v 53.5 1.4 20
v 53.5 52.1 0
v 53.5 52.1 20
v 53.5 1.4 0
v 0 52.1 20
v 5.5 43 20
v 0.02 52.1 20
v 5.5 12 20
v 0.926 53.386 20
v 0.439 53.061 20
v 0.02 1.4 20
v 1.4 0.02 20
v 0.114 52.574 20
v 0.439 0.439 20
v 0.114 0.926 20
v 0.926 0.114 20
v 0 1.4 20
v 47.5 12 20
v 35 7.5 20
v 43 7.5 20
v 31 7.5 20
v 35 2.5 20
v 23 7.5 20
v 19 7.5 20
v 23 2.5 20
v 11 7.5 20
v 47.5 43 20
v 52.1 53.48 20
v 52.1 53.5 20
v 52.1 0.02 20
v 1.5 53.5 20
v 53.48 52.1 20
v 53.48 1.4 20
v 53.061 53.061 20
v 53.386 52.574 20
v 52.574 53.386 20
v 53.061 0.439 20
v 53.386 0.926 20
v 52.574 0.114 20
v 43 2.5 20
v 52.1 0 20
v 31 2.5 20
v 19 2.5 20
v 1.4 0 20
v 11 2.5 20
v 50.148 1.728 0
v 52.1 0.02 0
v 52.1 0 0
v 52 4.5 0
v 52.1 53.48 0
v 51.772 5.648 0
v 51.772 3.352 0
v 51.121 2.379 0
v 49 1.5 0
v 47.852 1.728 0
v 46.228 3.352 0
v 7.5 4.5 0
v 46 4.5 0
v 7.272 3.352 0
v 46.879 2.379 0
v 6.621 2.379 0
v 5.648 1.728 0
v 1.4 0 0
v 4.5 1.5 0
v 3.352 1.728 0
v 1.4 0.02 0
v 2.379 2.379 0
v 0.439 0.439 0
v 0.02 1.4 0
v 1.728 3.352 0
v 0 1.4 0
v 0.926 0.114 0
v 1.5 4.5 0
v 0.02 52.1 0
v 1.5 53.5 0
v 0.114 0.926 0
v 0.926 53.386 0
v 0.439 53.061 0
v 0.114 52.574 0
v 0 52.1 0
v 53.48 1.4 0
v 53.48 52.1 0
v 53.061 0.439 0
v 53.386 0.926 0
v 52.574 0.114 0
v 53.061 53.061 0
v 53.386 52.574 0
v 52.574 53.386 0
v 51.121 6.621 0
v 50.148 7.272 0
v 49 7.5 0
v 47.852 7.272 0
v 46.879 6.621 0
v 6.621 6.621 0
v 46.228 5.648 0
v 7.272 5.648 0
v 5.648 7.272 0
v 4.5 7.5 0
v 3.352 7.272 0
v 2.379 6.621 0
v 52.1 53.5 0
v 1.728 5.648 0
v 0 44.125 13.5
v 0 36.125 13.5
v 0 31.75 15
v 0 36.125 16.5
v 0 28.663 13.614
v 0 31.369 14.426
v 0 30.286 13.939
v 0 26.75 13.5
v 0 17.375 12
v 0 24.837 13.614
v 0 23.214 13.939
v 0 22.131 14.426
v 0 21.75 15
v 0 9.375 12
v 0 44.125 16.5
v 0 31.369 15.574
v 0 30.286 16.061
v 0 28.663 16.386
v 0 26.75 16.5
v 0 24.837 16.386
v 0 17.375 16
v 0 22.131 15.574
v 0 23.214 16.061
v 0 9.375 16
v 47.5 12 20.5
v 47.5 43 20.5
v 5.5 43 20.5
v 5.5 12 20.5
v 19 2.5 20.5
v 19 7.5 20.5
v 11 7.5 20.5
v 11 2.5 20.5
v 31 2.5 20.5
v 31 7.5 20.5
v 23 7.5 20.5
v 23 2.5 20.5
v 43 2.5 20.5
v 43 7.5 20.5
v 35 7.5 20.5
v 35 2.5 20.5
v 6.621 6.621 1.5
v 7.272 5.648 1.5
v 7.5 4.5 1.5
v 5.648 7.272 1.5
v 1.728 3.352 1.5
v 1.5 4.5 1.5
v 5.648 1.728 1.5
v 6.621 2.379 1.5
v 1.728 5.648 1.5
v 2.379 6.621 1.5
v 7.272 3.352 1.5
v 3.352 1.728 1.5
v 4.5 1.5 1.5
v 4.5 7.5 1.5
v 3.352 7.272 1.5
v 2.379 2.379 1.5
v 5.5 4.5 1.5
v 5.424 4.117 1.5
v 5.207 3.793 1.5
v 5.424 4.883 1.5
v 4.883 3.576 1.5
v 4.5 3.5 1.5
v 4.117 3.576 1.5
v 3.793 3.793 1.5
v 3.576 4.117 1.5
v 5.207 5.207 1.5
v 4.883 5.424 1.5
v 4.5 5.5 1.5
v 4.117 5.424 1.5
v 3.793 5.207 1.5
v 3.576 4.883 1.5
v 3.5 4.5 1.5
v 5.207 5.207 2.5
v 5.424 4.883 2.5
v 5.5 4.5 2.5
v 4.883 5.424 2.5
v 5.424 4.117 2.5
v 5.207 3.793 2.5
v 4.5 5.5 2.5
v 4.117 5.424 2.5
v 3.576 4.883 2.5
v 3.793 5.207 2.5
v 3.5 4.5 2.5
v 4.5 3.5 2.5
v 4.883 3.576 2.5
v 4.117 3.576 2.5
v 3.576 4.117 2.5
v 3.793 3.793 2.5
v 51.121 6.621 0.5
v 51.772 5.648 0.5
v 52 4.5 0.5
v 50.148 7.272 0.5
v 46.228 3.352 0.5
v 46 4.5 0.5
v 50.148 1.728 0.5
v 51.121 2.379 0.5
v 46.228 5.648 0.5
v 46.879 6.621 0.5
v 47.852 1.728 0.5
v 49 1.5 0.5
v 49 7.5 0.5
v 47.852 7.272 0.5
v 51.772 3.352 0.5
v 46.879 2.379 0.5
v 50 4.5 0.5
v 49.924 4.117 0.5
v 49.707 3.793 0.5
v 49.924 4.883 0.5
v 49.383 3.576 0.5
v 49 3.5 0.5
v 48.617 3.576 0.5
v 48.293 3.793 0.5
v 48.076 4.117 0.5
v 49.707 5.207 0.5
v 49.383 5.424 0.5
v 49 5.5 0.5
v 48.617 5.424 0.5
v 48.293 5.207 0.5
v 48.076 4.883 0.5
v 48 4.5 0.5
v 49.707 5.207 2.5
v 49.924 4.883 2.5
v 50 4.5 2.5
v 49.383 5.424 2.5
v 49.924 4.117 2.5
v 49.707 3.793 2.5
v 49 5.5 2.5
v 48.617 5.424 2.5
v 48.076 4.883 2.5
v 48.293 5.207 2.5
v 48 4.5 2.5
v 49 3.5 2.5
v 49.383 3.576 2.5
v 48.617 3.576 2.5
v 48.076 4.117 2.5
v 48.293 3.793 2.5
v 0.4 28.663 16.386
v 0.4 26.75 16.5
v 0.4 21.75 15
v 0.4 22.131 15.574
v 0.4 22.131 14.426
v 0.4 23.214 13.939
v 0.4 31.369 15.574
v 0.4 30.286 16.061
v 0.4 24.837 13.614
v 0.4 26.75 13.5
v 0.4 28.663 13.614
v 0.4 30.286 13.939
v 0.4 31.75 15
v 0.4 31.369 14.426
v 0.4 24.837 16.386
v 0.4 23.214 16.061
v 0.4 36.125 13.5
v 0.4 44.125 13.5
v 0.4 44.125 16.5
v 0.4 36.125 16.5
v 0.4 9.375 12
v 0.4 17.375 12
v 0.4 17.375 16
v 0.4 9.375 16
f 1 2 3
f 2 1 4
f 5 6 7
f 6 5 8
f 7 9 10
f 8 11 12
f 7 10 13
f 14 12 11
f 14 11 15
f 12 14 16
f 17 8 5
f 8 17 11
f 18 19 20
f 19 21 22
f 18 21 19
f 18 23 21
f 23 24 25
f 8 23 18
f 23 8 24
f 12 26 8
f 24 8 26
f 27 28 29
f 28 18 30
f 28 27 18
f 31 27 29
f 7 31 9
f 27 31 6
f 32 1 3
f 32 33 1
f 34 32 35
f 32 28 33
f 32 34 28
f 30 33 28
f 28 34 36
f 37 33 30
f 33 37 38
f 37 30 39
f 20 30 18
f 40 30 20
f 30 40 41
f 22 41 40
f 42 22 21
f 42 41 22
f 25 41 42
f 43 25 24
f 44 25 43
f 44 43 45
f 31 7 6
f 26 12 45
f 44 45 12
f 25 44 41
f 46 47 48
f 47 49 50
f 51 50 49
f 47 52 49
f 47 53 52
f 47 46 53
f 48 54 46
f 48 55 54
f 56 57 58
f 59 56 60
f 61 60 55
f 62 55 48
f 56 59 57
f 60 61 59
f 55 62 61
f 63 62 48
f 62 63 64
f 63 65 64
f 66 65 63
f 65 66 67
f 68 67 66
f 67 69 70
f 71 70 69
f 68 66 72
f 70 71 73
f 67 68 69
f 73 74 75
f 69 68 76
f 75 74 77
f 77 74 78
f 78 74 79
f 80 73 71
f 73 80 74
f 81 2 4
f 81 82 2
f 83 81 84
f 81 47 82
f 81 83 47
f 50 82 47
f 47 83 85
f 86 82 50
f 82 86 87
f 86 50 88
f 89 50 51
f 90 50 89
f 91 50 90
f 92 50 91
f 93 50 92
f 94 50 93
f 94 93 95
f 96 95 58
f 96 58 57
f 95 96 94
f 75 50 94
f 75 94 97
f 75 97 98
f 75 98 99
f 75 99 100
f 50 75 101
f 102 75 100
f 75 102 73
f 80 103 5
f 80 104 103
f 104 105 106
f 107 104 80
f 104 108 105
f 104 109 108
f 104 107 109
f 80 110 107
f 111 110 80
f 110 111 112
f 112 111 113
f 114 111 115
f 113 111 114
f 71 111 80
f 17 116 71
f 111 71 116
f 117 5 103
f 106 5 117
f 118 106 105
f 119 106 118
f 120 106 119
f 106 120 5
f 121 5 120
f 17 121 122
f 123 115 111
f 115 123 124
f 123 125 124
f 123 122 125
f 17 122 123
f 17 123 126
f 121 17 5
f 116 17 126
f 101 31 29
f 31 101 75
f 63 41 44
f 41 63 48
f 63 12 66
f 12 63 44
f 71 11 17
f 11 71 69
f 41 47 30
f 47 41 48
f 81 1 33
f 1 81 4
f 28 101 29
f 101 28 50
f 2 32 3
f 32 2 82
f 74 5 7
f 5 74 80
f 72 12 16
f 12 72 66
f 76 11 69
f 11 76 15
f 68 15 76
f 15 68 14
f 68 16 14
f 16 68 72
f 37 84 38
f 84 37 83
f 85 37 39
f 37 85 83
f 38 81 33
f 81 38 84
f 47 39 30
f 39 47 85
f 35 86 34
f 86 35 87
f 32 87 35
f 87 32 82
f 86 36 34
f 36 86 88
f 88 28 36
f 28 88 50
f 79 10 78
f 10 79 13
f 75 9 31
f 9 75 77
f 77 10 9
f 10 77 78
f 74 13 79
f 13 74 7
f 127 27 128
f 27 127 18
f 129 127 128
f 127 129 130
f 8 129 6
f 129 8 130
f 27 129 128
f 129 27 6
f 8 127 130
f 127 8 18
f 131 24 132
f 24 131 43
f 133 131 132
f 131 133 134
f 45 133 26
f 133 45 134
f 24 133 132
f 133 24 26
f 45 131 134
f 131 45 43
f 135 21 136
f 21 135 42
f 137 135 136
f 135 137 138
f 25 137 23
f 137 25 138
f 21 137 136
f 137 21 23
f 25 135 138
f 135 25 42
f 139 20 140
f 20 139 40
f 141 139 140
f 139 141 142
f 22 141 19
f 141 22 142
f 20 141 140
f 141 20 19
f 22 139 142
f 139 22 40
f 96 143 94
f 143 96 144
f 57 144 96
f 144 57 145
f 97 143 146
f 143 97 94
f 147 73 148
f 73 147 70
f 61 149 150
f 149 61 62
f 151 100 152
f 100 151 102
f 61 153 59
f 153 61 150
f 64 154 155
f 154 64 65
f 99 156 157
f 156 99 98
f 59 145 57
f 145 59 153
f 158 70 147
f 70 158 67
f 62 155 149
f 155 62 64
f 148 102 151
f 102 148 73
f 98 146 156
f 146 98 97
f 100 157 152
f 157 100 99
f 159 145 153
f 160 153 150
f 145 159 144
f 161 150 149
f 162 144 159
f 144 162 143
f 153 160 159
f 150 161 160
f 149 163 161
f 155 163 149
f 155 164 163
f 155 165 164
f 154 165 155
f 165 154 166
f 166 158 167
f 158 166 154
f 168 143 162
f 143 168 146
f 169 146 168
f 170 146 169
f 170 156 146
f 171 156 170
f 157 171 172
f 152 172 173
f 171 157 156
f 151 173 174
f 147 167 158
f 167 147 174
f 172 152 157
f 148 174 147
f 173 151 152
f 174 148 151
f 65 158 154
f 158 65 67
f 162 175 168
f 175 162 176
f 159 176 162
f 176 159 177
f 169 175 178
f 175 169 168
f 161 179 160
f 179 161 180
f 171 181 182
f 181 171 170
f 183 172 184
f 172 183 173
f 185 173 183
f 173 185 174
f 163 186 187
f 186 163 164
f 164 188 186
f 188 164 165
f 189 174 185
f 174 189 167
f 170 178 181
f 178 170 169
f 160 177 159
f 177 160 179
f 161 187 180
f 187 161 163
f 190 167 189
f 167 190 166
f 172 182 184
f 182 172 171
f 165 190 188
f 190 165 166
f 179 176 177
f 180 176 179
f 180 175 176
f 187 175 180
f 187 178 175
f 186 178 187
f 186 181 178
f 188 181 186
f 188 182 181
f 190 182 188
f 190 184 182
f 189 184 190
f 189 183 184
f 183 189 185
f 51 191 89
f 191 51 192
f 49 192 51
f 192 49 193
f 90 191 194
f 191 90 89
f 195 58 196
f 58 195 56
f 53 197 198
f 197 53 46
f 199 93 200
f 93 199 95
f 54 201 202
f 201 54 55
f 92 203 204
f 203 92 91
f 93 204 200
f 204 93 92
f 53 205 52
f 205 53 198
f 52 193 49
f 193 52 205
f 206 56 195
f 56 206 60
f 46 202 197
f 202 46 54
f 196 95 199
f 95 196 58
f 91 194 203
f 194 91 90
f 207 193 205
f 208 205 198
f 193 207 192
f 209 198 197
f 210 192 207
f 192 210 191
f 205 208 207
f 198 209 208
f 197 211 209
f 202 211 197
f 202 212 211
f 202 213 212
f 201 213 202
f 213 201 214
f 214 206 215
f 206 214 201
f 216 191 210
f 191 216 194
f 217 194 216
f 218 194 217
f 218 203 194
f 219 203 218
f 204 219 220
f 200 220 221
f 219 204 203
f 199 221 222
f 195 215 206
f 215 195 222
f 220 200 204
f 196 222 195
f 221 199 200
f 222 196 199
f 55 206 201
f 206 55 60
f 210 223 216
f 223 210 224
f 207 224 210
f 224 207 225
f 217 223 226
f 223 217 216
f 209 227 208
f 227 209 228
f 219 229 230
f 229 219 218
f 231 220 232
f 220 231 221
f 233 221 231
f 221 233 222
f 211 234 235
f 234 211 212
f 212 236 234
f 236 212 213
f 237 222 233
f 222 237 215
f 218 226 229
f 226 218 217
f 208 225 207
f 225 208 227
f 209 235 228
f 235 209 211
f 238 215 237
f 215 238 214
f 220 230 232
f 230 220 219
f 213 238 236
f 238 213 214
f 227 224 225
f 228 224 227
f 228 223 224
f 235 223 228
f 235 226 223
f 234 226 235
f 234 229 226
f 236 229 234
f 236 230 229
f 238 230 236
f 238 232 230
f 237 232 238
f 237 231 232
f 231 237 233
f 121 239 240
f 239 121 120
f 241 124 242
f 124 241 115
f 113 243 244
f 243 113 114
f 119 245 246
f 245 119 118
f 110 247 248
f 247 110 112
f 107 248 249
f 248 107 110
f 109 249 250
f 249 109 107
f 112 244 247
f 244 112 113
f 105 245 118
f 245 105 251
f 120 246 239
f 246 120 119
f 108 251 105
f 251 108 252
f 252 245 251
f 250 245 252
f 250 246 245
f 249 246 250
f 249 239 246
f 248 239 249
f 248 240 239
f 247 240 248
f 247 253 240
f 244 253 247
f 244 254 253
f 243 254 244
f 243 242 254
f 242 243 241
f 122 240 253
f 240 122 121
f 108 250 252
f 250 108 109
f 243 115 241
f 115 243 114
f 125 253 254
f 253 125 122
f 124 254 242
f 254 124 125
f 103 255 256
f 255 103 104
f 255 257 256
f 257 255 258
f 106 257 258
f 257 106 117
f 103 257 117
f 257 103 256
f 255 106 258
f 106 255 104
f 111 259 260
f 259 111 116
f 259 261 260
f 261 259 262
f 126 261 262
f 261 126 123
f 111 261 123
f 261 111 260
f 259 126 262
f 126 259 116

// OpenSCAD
module core(height = 20) {

    s = 53.5; // inner size
    r = 1.5; // radius and cutout

    difference(){
    union() {
        difference(){
        scale([1,1,1]) color("blue") cube([s,s,height],center=false);

        translate([-.1,-.1,-.1]) scale([1,1,height+1]) cube(r,center=false);
        translate([s-r+.1,-.1,-.1]) scale([1,1,height+1]) cube(r,center=false);

        translate([s-r+.1,s-r+.1,-.1]) scale([1,1,height+1]) cube(r,center=false);
        translate([-.1,s-r+.1,-.1]) scale([1,1,height+1]) cube([r+.1,r+.1,height+1],center=false);

        }

    // radii
    translate([r,r,0]) scale([1,1,1]) cylinder(r=r,h=height,center=false, $fn=16);
    translate([s-r,r,0]) scale([1,1,1]) cylinder(r=r,h=height,center=false, $fn=16);
    translate([s-r,s-r,0]) scale([1,1,1]) cylinder(r=r,h=height,center=false, $fn=16);
    translate([r,s-r,0]) scale([1,1,1]) cylinder(r=r,h=height,center=false, $fn=16);

    // display
        translate([5.5,12,height-.5]) color("green") cube([42,31,1],center = false);
    // buttons
        translate([11,2.5,height-.5]) color("red") cube([8,5,1],center = false);
        translate([23,2.5,height-.5]) color("red") cube([8,5,1],center = false);
        translate([35,2.5,height-.5]) color("red") cube([8,5,1],center = false);

    }
    
        // mounting holes
    translate([4.5,4.5,-.5]) scale([1,1,1]) cylinder(r=3,h=2,center=false, $fn=16);
    translate([4.5,4.5,-.5]) scale([1,1,1]) cylinder(r=1,h=3,center=false, $fn=16);
    translate([s-4.5,4.5,-.5]) scale([1,1,1]) cylinder(r=3,h=1,center=false, $fn=16);
    translate([s-4.5,4.5,-.5]) scale([1,1,1]) cylinder(r=1,h=3,center=false, $fn=16);
    
    // usb
    translate([-.1,s/2,height-5]) rotate([0,90,0]) scale([.3,1,1]) cylinder(r=5,h=1,center=true, $fn=16);
    // pwr btn
    translate([-.1,3*s/4,height-5]) rotate([0,90,0]) scale([3,8,1]) cube(1,center=true);
    // grove
    translate([-.1,s/4,height-6]) rotate([0,90,0]) scale([4,8,1]) cube(1,center=true);
    
}


    
    
    
}

core();
